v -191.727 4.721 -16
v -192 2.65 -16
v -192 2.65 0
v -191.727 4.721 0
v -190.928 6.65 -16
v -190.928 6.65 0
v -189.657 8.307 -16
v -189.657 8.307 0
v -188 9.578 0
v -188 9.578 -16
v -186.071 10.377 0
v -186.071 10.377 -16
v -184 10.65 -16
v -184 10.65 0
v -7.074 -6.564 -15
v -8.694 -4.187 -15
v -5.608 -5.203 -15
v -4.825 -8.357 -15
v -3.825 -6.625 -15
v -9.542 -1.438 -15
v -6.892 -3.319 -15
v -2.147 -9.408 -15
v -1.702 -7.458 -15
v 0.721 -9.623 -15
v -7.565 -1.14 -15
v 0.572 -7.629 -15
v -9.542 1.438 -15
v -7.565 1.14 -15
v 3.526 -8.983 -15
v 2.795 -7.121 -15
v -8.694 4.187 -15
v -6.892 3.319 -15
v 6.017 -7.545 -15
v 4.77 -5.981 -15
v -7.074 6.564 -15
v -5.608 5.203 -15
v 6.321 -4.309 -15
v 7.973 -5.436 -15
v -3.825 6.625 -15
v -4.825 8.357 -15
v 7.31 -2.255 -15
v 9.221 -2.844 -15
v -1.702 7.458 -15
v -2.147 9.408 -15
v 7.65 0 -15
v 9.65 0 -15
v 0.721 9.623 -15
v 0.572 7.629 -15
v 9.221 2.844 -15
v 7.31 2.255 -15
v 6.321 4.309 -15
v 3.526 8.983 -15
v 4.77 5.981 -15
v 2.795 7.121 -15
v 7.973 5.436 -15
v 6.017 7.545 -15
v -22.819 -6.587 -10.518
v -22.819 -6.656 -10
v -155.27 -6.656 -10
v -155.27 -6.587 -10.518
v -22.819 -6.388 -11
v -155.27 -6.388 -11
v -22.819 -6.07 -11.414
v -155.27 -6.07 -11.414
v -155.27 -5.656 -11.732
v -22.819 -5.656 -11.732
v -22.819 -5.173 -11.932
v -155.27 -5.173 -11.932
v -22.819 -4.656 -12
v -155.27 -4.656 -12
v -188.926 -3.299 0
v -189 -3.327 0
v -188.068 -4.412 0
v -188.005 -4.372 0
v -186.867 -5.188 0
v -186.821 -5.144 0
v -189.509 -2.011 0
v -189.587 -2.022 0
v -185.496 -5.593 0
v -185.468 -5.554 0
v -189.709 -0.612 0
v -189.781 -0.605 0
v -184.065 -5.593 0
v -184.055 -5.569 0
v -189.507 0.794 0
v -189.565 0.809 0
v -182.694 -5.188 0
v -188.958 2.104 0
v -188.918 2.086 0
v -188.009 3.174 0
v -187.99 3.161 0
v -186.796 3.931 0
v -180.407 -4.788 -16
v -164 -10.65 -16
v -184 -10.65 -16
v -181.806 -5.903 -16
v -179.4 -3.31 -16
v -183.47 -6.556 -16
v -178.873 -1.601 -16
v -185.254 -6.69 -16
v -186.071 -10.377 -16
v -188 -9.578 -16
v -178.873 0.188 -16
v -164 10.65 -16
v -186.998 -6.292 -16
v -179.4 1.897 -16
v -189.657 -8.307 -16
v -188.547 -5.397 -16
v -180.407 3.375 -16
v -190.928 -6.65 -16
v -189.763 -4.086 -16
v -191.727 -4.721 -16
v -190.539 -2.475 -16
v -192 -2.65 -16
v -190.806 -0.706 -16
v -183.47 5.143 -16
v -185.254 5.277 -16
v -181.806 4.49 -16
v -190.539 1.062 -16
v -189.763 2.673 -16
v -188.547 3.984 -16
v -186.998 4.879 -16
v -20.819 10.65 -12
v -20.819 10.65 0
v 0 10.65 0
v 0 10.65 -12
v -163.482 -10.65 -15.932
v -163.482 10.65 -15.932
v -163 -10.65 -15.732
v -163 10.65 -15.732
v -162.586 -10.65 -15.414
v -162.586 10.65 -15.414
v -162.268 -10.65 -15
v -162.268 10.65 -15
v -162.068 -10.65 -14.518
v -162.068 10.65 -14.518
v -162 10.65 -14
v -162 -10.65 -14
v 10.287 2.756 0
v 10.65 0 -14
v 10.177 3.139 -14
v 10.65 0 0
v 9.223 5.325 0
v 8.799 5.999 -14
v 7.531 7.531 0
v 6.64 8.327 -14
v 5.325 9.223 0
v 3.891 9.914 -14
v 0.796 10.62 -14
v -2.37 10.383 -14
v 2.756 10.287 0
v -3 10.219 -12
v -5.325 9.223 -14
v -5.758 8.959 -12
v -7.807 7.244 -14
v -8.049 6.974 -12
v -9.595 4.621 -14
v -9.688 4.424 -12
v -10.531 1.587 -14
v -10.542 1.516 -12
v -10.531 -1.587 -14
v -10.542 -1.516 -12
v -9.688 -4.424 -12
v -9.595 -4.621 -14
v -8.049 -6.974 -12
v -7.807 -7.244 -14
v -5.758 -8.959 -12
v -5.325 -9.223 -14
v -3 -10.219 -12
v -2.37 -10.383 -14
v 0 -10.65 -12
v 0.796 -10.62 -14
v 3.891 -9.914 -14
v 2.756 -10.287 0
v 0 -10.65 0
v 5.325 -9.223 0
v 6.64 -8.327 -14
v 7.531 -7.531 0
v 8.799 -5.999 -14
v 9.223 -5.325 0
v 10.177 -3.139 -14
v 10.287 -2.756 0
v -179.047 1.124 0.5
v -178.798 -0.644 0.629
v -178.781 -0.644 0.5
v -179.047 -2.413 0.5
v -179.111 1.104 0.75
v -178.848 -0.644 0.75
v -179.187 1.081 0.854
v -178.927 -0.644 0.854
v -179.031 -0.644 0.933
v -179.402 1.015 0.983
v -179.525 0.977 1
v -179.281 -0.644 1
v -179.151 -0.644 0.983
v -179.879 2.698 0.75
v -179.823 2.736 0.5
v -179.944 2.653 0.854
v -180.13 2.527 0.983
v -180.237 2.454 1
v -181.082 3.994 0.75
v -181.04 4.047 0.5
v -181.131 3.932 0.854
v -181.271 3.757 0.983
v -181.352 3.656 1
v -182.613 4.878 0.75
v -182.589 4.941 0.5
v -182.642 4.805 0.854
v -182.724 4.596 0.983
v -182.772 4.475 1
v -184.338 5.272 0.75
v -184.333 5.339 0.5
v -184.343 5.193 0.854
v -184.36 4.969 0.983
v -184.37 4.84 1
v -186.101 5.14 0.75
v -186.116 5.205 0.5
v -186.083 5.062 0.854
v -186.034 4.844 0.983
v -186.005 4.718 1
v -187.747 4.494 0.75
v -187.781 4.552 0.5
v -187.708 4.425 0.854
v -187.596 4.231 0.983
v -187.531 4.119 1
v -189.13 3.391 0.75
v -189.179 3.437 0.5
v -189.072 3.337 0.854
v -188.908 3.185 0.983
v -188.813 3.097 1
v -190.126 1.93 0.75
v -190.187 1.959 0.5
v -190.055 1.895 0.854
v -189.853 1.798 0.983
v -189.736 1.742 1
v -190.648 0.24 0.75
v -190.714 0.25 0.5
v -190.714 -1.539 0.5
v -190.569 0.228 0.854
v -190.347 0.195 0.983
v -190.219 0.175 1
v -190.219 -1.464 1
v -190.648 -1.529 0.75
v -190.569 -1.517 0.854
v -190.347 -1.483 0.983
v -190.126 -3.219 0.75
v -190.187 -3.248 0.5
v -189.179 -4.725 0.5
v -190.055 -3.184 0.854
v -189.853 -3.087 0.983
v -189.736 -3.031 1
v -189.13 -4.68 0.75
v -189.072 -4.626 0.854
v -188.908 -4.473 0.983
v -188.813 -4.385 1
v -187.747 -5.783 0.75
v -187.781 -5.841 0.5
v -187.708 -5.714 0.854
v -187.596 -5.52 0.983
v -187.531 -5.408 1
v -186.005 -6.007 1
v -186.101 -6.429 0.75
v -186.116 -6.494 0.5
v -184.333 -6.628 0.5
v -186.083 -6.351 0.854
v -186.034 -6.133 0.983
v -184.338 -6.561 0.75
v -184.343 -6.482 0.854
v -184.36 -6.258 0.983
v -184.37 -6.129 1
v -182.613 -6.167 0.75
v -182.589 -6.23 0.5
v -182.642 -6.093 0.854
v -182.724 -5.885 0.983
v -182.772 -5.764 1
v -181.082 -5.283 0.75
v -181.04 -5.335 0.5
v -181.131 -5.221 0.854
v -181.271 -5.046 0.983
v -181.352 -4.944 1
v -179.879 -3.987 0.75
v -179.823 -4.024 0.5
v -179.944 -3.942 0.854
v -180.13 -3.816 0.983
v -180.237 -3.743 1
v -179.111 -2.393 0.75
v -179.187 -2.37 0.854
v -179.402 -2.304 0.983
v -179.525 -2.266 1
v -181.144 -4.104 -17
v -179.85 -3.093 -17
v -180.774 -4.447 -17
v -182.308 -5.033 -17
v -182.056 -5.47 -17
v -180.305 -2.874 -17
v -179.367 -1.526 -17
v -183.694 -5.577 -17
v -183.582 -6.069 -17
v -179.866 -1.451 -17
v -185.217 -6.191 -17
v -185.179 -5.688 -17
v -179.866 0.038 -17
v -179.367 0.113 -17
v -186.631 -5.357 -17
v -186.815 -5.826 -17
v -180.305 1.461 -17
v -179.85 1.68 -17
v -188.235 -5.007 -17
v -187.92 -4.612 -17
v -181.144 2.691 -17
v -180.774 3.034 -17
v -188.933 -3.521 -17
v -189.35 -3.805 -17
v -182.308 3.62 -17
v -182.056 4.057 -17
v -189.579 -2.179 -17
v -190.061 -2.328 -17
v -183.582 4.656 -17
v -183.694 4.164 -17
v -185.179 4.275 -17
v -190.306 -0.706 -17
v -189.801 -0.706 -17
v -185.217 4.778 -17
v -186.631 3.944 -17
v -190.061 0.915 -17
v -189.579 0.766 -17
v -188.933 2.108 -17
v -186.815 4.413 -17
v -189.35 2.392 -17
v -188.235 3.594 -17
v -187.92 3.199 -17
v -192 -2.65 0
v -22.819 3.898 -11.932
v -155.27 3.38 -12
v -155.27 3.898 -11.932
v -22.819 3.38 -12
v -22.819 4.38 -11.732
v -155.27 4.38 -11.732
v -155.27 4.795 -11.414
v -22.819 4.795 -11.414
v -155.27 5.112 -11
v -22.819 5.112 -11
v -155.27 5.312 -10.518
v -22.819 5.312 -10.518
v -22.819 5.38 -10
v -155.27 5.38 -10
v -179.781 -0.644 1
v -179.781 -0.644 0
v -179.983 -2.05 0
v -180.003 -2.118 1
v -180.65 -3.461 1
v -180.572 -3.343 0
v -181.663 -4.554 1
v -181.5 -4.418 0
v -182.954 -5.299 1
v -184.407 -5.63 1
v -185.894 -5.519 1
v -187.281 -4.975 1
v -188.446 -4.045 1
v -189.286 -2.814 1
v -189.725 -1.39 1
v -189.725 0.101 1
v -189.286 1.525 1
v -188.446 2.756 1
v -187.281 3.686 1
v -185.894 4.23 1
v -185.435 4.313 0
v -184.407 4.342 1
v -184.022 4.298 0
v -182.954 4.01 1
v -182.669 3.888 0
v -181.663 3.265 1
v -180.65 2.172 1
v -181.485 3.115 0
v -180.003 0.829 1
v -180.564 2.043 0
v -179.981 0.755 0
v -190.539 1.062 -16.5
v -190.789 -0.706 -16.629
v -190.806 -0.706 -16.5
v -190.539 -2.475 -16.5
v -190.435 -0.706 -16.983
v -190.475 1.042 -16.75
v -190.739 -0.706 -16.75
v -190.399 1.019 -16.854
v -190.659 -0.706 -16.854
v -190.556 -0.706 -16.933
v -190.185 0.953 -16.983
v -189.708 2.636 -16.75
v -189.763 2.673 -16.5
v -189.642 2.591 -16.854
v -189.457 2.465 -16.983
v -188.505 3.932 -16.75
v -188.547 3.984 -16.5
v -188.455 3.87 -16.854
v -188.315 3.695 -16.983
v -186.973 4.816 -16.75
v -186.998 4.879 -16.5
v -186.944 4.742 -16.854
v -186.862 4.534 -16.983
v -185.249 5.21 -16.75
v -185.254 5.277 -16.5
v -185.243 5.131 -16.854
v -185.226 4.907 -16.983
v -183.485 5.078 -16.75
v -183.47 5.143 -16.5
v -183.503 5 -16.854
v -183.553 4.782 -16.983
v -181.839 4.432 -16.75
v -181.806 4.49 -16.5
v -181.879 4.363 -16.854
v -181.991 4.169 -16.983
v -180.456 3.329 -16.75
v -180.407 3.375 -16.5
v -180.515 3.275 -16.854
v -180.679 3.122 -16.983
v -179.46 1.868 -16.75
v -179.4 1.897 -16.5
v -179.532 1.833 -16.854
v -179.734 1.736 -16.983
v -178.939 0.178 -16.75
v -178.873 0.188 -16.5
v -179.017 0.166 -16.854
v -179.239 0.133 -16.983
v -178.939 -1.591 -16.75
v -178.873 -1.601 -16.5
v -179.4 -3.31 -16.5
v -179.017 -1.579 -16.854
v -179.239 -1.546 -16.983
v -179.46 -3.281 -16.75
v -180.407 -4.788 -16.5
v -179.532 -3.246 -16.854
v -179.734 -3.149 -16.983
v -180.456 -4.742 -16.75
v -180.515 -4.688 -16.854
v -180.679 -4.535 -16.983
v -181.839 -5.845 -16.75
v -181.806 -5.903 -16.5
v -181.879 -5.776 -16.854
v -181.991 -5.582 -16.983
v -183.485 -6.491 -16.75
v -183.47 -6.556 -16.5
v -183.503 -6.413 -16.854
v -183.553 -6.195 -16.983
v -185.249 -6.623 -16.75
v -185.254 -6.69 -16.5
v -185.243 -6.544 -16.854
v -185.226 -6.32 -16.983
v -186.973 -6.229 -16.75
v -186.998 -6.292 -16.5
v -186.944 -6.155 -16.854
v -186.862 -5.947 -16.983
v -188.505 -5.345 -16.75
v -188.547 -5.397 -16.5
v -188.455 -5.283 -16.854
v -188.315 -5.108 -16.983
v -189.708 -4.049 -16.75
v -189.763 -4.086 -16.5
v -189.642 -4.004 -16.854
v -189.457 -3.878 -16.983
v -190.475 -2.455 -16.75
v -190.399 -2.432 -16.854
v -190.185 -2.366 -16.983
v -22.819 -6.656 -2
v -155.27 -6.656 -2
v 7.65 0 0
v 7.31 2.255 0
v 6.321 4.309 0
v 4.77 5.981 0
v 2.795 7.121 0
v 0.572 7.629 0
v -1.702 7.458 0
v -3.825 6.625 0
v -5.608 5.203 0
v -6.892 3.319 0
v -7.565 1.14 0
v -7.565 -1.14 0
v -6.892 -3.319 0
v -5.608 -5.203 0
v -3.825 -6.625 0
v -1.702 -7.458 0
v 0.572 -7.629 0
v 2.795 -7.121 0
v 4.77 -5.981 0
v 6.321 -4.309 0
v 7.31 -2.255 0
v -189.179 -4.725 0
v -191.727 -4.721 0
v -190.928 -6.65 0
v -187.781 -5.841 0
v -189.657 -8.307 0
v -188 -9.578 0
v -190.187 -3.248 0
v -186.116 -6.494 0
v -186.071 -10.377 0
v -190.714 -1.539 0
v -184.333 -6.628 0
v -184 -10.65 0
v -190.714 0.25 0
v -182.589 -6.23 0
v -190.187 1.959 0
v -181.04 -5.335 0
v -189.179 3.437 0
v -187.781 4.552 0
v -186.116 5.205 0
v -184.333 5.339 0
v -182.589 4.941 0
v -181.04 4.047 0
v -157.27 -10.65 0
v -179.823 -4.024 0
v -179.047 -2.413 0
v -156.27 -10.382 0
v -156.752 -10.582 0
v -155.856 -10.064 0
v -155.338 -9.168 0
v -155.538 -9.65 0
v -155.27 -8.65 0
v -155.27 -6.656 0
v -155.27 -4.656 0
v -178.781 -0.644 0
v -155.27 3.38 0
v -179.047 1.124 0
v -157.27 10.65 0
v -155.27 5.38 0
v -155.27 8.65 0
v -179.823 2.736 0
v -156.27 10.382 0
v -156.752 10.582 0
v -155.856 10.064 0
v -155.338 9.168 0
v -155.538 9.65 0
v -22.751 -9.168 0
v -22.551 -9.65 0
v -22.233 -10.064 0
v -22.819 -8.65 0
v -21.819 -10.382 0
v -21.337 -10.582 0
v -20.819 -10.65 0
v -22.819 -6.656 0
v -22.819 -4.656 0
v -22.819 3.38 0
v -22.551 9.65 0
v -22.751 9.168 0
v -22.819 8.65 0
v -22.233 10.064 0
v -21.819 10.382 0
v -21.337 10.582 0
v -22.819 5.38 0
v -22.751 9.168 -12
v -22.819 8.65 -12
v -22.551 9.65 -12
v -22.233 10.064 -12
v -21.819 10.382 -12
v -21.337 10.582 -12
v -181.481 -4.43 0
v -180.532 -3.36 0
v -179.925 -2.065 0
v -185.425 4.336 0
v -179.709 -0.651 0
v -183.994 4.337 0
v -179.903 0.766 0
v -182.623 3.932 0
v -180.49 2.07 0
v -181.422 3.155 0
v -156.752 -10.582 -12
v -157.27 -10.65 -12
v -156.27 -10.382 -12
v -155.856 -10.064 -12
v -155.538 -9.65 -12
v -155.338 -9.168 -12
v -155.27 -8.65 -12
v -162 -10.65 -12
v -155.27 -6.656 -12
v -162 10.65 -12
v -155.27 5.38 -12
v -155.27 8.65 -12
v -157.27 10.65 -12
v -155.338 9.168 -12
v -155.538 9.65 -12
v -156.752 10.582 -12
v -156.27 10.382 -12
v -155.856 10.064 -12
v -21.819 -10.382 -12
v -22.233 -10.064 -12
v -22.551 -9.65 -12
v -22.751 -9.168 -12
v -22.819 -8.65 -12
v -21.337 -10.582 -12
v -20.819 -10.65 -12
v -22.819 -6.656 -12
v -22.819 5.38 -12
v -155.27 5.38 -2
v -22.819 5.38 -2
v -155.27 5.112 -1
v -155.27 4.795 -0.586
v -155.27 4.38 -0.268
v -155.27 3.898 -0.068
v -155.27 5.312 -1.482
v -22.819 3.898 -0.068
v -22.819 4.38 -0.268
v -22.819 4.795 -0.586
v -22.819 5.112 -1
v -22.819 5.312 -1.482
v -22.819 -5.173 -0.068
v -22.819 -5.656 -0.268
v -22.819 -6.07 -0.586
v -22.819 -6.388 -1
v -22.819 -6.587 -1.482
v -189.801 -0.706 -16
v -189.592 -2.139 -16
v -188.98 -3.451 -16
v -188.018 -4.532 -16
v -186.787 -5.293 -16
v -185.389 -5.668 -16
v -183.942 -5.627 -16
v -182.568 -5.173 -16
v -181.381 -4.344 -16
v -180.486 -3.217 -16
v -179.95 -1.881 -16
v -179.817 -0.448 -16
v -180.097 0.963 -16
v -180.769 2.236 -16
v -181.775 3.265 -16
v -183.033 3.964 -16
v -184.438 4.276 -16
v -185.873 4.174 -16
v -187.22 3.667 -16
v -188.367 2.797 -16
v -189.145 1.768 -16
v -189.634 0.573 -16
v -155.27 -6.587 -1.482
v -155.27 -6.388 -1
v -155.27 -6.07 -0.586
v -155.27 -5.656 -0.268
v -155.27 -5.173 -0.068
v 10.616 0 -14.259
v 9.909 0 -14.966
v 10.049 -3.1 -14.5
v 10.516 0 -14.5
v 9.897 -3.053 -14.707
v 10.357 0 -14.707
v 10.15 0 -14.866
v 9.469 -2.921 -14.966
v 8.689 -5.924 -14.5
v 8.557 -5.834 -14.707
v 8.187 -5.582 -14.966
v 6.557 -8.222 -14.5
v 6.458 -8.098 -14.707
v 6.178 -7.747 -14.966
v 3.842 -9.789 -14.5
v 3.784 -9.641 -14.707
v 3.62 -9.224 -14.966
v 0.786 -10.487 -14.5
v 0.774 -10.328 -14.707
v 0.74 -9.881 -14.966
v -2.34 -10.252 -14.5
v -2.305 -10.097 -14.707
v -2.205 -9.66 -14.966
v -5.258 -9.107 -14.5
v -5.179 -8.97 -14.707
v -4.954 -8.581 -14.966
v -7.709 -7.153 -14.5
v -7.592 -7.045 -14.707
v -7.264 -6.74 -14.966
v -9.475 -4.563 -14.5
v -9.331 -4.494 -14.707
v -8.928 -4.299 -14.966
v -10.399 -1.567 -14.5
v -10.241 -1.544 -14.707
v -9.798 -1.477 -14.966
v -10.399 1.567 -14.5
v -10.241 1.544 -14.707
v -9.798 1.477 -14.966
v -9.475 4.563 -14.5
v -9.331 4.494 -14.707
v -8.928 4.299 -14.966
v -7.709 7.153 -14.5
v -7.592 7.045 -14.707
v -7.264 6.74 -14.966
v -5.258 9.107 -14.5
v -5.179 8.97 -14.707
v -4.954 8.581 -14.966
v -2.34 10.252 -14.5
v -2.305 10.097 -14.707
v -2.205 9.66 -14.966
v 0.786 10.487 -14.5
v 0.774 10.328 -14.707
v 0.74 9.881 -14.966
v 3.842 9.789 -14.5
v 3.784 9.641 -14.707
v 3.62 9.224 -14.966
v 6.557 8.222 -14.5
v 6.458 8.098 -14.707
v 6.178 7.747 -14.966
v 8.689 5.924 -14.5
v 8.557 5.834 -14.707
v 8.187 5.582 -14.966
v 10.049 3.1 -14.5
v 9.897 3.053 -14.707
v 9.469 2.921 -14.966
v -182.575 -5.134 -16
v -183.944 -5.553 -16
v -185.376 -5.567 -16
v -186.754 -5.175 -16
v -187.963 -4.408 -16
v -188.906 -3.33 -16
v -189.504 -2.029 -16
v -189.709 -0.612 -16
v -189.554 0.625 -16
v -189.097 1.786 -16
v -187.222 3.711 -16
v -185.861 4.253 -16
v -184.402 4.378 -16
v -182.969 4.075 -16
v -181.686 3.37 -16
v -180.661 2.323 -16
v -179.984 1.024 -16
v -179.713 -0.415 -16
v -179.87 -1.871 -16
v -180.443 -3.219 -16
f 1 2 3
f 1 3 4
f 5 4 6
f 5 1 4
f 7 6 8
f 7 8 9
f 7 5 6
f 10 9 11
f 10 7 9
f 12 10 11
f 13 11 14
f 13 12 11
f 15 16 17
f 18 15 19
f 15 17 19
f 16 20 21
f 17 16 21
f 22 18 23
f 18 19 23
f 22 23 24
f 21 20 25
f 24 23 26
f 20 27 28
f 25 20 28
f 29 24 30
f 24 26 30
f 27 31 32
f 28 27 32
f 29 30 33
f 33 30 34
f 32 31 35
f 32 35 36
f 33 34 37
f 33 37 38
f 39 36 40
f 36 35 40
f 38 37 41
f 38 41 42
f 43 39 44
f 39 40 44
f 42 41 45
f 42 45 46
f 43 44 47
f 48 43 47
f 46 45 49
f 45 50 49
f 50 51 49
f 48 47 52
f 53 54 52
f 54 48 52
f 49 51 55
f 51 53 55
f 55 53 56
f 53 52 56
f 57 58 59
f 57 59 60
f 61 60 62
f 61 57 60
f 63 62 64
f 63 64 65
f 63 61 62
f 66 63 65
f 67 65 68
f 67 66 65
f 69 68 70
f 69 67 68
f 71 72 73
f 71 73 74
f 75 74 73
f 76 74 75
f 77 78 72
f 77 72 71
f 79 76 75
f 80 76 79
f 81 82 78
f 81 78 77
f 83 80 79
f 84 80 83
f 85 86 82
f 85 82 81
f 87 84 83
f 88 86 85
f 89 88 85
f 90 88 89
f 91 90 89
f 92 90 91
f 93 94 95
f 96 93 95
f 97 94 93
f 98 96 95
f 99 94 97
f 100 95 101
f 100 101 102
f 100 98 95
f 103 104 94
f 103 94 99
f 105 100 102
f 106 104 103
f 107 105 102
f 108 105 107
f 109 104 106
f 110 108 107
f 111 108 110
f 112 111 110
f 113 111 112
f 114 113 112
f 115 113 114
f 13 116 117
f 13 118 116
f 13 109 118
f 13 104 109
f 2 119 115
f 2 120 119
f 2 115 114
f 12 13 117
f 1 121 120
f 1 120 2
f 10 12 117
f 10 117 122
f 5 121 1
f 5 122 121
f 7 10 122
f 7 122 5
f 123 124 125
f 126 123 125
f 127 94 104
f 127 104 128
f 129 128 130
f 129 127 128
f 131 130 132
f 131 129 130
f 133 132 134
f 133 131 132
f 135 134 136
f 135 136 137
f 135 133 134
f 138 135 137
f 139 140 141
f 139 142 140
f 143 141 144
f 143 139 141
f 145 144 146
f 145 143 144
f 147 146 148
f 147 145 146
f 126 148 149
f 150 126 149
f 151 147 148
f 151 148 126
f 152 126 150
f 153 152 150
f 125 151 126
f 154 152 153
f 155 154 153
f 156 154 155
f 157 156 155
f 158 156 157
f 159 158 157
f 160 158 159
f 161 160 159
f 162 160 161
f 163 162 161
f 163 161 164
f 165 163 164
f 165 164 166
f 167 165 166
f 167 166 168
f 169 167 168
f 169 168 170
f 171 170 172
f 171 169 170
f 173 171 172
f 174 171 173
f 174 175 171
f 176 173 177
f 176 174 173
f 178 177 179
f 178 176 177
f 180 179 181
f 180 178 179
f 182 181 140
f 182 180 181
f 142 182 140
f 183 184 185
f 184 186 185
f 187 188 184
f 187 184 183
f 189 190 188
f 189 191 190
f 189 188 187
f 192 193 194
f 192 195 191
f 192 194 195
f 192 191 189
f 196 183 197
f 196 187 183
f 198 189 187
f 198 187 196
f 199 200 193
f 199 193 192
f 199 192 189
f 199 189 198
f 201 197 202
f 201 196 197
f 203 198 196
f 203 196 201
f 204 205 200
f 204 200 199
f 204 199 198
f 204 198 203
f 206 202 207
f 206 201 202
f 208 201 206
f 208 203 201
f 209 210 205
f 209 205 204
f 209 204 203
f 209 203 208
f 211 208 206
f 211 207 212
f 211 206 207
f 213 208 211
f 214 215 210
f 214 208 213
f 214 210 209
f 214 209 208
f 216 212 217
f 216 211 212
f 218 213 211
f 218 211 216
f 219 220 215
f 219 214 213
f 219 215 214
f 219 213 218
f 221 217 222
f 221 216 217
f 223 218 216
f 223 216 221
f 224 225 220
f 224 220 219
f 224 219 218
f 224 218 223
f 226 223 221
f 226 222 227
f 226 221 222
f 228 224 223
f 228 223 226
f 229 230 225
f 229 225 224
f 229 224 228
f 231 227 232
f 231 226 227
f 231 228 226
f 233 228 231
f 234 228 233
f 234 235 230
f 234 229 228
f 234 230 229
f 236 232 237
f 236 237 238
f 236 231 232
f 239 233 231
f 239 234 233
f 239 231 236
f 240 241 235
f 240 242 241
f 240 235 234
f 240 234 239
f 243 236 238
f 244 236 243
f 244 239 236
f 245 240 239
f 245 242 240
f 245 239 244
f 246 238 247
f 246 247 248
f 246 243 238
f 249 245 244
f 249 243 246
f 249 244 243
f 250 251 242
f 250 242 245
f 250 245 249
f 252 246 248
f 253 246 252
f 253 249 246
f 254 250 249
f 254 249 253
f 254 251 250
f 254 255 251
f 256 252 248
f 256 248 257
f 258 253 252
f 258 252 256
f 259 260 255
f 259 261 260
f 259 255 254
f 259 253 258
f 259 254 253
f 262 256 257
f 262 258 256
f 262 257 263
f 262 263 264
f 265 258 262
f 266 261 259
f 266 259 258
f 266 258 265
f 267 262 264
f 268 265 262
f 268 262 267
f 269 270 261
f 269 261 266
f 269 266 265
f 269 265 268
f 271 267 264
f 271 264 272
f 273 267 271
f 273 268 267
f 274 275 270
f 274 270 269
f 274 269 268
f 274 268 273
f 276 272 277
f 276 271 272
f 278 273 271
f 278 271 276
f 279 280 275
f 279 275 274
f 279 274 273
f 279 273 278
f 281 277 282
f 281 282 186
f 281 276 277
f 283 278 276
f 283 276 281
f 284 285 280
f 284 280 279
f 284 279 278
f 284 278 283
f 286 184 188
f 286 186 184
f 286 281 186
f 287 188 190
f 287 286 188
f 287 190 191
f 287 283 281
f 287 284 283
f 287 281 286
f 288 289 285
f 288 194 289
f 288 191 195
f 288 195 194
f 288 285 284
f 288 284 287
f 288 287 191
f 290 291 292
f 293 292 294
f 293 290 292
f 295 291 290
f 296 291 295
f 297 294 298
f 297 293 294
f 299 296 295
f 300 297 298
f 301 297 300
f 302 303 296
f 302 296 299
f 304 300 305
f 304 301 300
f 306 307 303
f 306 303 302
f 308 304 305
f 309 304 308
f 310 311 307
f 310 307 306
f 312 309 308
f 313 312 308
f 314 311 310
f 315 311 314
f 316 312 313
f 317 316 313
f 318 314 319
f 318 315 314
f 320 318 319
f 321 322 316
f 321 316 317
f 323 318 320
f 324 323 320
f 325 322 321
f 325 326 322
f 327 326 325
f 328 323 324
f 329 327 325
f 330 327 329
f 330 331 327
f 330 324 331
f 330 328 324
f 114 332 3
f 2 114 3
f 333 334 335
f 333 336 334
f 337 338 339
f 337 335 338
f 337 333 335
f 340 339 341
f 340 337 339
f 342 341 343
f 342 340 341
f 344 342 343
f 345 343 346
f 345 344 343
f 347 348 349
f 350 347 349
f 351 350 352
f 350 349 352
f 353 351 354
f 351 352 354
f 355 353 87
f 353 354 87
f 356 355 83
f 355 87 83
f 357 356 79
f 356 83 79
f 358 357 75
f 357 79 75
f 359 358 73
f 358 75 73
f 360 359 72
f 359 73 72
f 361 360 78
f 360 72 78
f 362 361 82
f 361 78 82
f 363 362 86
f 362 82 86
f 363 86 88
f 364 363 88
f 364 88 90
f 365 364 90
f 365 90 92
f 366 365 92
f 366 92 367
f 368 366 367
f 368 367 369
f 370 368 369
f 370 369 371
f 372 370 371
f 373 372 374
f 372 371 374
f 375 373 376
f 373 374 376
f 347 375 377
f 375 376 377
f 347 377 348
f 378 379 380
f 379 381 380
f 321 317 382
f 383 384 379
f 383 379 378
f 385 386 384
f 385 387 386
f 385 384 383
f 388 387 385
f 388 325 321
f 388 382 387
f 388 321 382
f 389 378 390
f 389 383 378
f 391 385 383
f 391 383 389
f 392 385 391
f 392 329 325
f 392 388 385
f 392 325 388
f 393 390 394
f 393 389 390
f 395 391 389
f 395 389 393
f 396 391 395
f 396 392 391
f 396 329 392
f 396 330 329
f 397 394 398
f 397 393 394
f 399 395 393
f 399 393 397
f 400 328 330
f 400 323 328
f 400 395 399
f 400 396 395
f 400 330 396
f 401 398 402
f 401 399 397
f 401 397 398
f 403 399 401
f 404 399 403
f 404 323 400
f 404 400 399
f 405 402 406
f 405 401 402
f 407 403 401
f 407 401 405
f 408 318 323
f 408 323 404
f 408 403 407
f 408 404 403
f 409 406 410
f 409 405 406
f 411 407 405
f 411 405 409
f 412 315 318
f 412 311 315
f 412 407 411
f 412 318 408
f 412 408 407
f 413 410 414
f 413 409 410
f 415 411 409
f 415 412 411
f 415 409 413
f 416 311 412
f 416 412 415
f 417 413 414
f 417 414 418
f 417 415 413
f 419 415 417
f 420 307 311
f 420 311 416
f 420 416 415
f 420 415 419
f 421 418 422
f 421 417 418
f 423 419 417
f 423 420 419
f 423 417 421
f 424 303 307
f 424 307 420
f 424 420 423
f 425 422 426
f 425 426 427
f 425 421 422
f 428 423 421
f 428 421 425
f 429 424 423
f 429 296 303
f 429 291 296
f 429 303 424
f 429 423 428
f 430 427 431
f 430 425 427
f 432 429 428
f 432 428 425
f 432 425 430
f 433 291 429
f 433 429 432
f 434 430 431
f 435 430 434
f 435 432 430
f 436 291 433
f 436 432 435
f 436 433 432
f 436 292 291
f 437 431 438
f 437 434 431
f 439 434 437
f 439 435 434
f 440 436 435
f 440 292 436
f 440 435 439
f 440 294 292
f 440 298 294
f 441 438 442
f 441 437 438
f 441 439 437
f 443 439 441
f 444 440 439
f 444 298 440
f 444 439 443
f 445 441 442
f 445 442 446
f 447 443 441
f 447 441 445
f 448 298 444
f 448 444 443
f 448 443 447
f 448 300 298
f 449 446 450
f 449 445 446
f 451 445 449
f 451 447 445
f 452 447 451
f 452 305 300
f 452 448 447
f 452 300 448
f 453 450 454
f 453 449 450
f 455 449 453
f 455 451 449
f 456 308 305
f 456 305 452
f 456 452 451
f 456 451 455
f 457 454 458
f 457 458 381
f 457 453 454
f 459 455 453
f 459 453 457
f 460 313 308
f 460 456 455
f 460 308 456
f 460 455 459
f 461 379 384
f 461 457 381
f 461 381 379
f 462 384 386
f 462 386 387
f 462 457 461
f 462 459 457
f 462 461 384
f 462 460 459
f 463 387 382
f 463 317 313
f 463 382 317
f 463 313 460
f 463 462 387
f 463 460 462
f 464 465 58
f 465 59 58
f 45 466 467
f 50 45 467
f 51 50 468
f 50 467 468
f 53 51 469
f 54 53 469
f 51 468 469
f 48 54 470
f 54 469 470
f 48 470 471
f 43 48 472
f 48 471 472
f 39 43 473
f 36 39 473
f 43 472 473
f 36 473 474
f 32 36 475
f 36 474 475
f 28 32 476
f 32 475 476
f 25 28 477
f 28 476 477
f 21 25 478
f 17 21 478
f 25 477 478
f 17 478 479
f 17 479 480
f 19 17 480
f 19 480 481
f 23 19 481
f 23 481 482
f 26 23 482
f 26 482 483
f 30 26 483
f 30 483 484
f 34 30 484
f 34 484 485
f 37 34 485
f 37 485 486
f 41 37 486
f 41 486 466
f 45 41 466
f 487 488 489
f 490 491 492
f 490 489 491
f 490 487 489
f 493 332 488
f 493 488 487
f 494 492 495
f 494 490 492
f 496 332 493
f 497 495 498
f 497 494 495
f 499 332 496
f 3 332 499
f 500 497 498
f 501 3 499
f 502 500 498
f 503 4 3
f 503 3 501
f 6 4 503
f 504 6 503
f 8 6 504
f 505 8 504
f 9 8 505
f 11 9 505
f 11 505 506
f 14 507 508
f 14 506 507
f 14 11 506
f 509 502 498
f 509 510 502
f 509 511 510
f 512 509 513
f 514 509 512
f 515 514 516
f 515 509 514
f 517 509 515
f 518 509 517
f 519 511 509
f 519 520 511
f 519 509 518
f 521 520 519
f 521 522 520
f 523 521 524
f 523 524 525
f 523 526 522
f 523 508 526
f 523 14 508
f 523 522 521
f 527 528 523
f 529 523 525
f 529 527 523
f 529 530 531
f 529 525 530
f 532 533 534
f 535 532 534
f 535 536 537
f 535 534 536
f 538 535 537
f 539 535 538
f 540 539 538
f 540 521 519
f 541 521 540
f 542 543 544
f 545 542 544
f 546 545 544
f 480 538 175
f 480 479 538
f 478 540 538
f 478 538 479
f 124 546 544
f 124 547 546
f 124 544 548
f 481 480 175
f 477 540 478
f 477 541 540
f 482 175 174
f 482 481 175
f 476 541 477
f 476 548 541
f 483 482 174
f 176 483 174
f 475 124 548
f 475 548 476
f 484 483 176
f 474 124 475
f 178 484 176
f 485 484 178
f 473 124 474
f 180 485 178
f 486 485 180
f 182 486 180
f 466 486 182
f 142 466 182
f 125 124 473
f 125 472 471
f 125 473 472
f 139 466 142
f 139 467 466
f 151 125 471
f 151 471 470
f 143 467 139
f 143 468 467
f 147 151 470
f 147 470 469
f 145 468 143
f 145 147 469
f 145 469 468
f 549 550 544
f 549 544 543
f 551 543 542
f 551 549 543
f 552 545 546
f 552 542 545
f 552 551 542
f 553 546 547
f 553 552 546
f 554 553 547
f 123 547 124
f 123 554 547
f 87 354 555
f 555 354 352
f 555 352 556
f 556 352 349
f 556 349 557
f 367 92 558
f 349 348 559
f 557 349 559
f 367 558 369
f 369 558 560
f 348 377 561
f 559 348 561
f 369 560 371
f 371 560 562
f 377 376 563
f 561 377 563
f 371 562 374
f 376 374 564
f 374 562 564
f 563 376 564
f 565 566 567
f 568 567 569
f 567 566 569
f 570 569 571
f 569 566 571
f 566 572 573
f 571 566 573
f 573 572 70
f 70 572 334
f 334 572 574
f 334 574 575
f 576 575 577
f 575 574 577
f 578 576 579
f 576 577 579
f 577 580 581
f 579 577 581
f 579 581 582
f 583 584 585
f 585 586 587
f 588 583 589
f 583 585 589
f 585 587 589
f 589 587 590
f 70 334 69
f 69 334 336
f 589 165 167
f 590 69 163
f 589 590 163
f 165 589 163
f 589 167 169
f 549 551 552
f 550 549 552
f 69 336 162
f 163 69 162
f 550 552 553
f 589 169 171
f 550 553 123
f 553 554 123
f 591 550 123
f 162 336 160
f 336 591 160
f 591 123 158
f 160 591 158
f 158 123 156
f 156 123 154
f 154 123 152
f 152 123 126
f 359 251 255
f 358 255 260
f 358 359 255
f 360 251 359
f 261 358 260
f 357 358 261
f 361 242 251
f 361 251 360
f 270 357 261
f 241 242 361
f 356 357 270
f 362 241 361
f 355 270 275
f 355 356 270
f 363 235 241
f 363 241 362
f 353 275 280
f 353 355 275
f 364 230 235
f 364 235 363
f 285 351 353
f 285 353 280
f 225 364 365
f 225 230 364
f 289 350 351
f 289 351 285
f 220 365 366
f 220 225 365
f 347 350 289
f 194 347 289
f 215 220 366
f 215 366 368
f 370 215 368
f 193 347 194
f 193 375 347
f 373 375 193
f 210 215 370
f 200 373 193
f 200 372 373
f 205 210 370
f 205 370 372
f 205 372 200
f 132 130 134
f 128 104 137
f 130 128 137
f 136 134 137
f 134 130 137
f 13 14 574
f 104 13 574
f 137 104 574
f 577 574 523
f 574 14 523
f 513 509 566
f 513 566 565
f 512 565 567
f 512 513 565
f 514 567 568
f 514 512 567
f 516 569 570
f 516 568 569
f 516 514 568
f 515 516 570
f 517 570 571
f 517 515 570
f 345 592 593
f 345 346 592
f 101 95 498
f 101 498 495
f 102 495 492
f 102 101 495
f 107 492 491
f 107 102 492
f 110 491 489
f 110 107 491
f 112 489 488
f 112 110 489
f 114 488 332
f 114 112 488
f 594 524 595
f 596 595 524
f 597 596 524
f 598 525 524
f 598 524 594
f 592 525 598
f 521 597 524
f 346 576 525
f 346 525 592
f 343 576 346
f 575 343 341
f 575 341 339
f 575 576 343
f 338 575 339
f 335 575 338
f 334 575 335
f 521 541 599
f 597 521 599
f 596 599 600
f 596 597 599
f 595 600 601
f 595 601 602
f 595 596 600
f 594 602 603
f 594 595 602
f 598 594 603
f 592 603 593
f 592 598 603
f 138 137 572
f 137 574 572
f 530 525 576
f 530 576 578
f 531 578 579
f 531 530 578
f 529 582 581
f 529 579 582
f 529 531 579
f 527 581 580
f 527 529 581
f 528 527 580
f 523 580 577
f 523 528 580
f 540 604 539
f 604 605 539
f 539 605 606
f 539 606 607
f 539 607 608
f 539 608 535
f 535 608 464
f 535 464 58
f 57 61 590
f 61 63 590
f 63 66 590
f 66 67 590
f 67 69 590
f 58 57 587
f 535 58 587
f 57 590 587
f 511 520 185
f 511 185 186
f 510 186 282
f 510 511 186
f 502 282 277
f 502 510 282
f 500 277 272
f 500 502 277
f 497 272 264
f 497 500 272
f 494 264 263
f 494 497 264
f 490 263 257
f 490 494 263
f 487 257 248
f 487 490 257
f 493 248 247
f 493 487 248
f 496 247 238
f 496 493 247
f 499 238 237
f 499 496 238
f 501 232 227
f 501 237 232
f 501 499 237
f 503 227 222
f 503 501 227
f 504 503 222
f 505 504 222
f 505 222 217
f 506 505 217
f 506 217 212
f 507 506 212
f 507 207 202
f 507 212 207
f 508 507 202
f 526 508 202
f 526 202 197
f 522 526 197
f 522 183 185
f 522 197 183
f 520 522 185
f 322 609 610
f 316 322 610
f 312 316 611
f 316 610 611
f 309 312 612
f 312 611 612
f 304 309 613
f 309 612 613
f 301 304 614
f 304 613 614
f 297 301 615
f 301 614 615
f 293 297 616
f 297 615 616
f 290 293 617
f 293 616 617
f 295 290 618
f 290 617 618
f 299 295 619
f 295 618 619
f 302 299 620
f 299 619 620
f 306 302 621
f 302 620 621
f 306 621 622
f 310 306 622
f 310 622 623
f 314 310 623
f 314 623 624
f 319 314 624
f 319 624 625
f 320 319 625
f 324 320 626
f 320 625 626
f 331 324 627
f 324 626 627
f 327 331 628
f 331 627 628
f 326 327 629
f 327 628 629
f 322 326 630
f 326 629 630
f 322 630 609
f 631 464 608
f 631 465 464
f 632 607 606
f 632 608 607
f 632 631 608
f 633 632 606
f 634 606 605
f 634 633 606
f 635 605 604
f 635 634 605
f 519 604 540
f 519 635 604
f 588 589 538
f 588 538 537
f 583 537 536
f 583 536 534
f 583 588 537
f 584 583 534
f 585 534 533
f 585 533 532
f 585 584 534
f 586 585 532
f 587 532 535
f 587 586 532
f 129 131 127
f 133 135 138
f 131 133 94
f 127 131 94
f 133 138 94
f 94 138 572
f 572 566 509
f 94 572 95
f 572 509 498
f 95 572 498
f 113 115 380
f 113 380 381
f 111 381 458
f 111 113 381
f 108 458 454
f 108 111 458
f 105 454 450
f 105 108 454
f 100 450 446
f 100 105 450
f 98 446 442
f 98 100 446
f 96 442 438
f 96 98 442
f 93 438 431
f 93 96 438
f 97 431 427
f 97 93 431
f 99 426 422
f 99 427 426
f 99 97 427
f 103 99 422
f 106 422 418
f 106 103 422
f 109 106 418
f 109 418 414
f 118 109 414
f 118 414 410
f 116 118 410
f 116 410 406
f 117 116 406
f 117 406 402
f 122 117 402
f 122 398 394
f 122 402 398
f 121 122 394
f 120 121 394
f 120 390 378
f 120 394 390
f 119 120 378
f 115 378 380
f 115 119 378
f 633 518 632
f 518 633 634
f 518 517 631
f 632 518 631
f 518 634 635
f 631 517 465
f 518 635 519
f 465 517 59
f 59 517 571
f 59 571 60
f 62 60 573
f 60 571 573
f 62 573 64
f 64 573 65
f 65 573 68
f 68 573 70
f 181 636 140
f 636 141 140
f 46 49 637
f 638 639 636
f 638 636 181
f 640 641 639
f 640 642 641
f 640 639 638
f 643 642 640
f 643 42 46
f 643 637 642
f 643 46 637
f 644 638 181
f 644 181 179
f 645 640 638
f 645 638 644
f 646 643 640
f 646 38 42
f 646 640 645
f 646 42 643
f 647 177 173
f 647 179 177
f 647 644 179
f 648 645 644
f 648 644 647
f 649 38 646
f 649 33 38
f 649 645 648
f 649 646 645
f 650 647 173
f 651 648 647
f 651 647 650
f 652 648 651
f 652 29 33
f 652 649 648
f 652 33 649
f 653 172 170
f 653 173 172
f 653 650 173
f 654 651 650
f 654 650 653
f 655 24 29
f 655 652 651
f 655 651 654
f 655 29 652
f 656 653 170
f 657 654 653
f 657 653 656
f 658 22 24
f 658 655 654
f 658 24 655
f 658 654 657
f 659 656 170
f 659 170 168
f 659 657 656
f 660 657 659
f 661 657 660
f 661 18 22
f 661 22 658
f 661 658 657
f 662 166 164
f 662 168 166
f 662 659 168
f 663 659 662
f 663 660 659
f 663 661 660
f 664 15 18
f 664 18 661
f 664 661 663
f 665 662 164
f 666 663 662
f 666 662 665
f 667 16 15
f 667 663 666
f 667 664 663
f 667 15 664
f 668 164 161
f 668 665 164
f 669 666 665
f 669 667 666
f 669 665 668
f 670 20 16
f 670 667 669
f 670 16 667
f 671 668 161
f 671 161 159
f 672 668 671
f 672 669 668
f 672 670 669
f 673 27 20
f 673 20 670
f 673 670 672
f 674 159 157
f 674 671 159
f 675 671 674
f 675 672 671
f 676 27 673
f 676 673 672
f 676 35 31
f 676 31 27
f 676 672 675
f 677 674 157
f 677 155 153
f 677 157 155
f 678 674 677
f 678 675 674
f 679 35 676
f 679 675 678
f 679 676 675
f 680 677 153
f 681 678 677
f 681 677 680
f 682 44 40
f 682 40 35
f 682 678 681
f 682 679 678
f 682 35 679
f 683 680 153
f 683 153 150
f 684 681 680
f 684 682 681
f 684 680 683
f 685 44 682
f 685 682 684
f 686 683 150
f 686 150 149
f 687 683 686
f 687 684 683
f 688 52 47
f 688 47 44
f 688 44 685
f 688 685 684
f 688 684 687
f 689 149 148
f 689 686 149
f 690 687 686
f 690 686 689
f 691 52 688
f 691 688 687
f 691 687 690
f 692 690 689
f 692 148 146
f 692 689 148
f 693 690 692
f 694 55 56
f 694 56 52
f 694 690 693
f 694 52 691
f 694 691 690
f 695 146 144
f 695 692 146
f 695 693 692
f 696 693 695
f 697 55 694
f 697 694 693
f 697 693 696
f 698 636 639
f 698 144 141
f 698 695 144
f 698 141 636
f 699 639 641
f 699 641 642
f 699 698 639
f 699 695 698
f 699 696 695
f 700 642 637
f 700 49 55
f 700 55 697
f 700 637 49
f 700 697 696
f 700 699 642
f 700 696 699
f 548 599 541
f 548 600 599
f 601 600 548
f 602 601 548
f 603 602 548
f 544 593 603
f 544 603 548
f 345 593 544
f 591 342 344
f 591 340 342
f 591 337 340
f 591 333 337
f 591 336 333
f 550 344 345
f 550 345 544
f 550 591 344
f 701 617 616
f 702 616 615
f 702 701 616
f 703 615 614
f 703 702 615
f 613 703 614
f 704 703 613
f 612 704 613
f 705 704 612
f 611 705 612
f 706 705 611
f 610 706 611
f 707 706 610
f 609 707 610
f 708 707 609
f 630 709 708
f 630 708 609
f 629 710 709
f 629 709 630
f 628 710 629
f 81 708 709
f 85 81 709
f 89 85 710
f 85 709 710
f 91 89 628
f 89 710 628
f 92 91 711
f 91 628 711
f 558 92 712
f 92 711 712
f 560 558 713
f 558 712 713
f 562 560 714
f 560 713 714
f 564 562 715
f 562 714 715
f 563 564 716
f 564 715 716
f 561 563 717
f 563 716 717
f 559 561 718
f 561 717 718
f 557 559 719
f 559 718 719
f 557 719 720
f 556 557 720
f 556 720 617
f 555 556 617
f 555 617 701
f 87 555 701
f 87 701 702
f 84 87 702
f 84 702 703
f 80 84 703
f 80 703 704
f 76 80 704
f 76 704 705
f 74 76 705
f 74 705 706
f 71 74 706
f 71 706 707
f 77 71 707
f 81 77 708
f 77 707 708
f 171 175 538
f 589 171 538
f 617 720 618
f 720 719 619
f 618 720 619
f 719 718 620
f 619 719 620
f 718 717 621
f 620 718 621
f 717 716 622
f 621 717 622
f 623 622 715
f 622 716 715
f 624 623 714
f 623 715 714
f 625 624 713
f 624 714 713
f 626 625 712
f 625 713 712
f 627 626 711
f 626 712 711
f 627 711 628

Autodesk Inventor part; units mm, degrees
ref_plane "YZ Plane" through (0, 0, 0) normal (1, 0, 0) x (0, 1, 0)
ref_plane "XZ Plane" through (0, 0, 0) normal (0, 1, 0) x (-1, 0, 0)
ref_plane "XY Plane" through (0, 0, 0) normal (0, 0, 1) x (1, 0, 0)
sketch "Boceto1" plane through (0, 0, 0) normal (0, 0, 1) x (1, 0, 0)
  circle A0 centre (0, 0) radius 7.65
  circle A1 centre (0, 0) radius 10.65
  dimension "d0" = 15.3
  dimension "d1" = 21.3
extrude "Extrusión1" add sketch "Boceto1" against normal blind 15
sketch "Boceto4" plane through (0, 0, 0) normal (0, 0, 1) x (1, 0, 0)
  circle A0 centre (0, 0) radius 10.65 projected
  line L0 (0, -10.65) -> (-192, -10.65)
  line L1 (0, -10.65) -> (192, -10.65) construction
  line L2 (0, 10.65) -> (-192, 10.65)
  line L3 (-192, 10.65) -> (-192, -10.65)
  dimension "d4" = 192
  dimension "d5" = 180
extrude "Extrusión2" add sketch "Boceto4" against normal blind 12 contours A0 L0 L3 L2
sketch "Boceto17" plane through (0, 0, -12) normal (0, 0, -1) x (-1, 0, 0)
  line L0 (192, -10.65) -> (192, 10.65) projected
  line L1 (0, -10.65) -> (192, -10.65) projected
  line L2 (192, 10.65) -> (162, 10.65)
  line L3 (162, 10.65) -> (162, -10.65)
  line L4 (162, -10.65) -> (192, -10.65)
  line L5 (192, -10.65) -> (192, 10.65)
  point P0 (0, 0)
  dimension "d75" = 30
extrude "Extrusión14" add sketch "Boceto17" along normal blind 4
sketch "Boceto18" plane through (0, 0, -16) normal (0, 0, -1) x (-1, 0, 0)
  circle A0 centre (184.7091, -0.6121) radius 5
  point P0 (0, 0)
  dimension "d78" = 10
extrude "Extrusión15" cut sketch "Boceto18" against normal blind 16
sketch "Boceto19" plane through (0, 0, -16) normal (0, 0, -1) x (-1, 0, 0)
  circle A0 centre (184.8056, -0.7065) radius 4.9956
  circle A1 centre (184.8056, -0.7065) radius 6
  point P0 (0, 0)
  dimension "d81" = 12
extrude "Extrusión16" add sketch "Boceto19" along normal blind 1
fillet "Empalme10" radius 0.5 1 edges at (-178.8056, -0.7065, -17)
fillet "Empalme11" radius 8 2 edges at (-192, 10.65, -8) (-192, -10.65, -8)
sketch "Boceto20" plane through (0, 0, 0) normal (0, 0, 1) x (1, 0, 0)
  circle A0 centre (-184.7809, -0.6444) radius 5
  circle A1 centre (-184.7809, -0.6444) radius 6
  point P0 (0, 0)
  dimension "d86" = 10
  dimension "d87" = 12
extrude "Extrusión17" add sketch "Boceto20" along normal blind 1
fillet "Empalme12" radius 0.5 1 edges at (-190.7809, -0.6444, 1)
fillet "Empalme13" radius 2 1 edges at (-162, 0, -16)
fillet "Empalme14" radius 1 1 edges at (-10.65, 0, -15)
sketch "Boceto21" plane through (0, 0, -12) normal (0, 0, -1) x (-1, 0, 0)
  line L0 (155.2699, -6.6555) -> (22.8192, -6.6555)
  line L1 (22.8192, -6.6555) -> (22.8192, -15.3654)
  line L2 (22.8192, -15.3654) -> (155.2699, -15.3654)
  line L3 (155.2699, -15.3654) -> (155.2699, -6.6555)
  line L4 (155.2699, 5.3804) -> (22.8192, 5.3804)
  line L5 (22.8192, 5.3804) -> (22.8192, 12.897)
  line L6 (22.8192, 12.897) -> (155.2699, 12.897)
  line L7 (155.2699, 12.897) -> (155.2699, 5.3804)
  point P0 (0, 0)
extrude "Extrusión18" cut sketch "Boceto21" against normal blind 24
fillet "Empalme15" radius 2 4 edges at (-22.8192, 10.65, -6) (-22.8192, -10.65, -6) (-155.2699, 10.65, -6) (-155.2699, -10.65, -6)
fillet "Empalme16" radius 2 4 edges at (-89.0446, 5.3804, -12) (-89.0446, -6.6555, -12) (-89.0446, 5.3804, 0) (-89.0446, -6.6555, 0)
properties part number "barraConector"
